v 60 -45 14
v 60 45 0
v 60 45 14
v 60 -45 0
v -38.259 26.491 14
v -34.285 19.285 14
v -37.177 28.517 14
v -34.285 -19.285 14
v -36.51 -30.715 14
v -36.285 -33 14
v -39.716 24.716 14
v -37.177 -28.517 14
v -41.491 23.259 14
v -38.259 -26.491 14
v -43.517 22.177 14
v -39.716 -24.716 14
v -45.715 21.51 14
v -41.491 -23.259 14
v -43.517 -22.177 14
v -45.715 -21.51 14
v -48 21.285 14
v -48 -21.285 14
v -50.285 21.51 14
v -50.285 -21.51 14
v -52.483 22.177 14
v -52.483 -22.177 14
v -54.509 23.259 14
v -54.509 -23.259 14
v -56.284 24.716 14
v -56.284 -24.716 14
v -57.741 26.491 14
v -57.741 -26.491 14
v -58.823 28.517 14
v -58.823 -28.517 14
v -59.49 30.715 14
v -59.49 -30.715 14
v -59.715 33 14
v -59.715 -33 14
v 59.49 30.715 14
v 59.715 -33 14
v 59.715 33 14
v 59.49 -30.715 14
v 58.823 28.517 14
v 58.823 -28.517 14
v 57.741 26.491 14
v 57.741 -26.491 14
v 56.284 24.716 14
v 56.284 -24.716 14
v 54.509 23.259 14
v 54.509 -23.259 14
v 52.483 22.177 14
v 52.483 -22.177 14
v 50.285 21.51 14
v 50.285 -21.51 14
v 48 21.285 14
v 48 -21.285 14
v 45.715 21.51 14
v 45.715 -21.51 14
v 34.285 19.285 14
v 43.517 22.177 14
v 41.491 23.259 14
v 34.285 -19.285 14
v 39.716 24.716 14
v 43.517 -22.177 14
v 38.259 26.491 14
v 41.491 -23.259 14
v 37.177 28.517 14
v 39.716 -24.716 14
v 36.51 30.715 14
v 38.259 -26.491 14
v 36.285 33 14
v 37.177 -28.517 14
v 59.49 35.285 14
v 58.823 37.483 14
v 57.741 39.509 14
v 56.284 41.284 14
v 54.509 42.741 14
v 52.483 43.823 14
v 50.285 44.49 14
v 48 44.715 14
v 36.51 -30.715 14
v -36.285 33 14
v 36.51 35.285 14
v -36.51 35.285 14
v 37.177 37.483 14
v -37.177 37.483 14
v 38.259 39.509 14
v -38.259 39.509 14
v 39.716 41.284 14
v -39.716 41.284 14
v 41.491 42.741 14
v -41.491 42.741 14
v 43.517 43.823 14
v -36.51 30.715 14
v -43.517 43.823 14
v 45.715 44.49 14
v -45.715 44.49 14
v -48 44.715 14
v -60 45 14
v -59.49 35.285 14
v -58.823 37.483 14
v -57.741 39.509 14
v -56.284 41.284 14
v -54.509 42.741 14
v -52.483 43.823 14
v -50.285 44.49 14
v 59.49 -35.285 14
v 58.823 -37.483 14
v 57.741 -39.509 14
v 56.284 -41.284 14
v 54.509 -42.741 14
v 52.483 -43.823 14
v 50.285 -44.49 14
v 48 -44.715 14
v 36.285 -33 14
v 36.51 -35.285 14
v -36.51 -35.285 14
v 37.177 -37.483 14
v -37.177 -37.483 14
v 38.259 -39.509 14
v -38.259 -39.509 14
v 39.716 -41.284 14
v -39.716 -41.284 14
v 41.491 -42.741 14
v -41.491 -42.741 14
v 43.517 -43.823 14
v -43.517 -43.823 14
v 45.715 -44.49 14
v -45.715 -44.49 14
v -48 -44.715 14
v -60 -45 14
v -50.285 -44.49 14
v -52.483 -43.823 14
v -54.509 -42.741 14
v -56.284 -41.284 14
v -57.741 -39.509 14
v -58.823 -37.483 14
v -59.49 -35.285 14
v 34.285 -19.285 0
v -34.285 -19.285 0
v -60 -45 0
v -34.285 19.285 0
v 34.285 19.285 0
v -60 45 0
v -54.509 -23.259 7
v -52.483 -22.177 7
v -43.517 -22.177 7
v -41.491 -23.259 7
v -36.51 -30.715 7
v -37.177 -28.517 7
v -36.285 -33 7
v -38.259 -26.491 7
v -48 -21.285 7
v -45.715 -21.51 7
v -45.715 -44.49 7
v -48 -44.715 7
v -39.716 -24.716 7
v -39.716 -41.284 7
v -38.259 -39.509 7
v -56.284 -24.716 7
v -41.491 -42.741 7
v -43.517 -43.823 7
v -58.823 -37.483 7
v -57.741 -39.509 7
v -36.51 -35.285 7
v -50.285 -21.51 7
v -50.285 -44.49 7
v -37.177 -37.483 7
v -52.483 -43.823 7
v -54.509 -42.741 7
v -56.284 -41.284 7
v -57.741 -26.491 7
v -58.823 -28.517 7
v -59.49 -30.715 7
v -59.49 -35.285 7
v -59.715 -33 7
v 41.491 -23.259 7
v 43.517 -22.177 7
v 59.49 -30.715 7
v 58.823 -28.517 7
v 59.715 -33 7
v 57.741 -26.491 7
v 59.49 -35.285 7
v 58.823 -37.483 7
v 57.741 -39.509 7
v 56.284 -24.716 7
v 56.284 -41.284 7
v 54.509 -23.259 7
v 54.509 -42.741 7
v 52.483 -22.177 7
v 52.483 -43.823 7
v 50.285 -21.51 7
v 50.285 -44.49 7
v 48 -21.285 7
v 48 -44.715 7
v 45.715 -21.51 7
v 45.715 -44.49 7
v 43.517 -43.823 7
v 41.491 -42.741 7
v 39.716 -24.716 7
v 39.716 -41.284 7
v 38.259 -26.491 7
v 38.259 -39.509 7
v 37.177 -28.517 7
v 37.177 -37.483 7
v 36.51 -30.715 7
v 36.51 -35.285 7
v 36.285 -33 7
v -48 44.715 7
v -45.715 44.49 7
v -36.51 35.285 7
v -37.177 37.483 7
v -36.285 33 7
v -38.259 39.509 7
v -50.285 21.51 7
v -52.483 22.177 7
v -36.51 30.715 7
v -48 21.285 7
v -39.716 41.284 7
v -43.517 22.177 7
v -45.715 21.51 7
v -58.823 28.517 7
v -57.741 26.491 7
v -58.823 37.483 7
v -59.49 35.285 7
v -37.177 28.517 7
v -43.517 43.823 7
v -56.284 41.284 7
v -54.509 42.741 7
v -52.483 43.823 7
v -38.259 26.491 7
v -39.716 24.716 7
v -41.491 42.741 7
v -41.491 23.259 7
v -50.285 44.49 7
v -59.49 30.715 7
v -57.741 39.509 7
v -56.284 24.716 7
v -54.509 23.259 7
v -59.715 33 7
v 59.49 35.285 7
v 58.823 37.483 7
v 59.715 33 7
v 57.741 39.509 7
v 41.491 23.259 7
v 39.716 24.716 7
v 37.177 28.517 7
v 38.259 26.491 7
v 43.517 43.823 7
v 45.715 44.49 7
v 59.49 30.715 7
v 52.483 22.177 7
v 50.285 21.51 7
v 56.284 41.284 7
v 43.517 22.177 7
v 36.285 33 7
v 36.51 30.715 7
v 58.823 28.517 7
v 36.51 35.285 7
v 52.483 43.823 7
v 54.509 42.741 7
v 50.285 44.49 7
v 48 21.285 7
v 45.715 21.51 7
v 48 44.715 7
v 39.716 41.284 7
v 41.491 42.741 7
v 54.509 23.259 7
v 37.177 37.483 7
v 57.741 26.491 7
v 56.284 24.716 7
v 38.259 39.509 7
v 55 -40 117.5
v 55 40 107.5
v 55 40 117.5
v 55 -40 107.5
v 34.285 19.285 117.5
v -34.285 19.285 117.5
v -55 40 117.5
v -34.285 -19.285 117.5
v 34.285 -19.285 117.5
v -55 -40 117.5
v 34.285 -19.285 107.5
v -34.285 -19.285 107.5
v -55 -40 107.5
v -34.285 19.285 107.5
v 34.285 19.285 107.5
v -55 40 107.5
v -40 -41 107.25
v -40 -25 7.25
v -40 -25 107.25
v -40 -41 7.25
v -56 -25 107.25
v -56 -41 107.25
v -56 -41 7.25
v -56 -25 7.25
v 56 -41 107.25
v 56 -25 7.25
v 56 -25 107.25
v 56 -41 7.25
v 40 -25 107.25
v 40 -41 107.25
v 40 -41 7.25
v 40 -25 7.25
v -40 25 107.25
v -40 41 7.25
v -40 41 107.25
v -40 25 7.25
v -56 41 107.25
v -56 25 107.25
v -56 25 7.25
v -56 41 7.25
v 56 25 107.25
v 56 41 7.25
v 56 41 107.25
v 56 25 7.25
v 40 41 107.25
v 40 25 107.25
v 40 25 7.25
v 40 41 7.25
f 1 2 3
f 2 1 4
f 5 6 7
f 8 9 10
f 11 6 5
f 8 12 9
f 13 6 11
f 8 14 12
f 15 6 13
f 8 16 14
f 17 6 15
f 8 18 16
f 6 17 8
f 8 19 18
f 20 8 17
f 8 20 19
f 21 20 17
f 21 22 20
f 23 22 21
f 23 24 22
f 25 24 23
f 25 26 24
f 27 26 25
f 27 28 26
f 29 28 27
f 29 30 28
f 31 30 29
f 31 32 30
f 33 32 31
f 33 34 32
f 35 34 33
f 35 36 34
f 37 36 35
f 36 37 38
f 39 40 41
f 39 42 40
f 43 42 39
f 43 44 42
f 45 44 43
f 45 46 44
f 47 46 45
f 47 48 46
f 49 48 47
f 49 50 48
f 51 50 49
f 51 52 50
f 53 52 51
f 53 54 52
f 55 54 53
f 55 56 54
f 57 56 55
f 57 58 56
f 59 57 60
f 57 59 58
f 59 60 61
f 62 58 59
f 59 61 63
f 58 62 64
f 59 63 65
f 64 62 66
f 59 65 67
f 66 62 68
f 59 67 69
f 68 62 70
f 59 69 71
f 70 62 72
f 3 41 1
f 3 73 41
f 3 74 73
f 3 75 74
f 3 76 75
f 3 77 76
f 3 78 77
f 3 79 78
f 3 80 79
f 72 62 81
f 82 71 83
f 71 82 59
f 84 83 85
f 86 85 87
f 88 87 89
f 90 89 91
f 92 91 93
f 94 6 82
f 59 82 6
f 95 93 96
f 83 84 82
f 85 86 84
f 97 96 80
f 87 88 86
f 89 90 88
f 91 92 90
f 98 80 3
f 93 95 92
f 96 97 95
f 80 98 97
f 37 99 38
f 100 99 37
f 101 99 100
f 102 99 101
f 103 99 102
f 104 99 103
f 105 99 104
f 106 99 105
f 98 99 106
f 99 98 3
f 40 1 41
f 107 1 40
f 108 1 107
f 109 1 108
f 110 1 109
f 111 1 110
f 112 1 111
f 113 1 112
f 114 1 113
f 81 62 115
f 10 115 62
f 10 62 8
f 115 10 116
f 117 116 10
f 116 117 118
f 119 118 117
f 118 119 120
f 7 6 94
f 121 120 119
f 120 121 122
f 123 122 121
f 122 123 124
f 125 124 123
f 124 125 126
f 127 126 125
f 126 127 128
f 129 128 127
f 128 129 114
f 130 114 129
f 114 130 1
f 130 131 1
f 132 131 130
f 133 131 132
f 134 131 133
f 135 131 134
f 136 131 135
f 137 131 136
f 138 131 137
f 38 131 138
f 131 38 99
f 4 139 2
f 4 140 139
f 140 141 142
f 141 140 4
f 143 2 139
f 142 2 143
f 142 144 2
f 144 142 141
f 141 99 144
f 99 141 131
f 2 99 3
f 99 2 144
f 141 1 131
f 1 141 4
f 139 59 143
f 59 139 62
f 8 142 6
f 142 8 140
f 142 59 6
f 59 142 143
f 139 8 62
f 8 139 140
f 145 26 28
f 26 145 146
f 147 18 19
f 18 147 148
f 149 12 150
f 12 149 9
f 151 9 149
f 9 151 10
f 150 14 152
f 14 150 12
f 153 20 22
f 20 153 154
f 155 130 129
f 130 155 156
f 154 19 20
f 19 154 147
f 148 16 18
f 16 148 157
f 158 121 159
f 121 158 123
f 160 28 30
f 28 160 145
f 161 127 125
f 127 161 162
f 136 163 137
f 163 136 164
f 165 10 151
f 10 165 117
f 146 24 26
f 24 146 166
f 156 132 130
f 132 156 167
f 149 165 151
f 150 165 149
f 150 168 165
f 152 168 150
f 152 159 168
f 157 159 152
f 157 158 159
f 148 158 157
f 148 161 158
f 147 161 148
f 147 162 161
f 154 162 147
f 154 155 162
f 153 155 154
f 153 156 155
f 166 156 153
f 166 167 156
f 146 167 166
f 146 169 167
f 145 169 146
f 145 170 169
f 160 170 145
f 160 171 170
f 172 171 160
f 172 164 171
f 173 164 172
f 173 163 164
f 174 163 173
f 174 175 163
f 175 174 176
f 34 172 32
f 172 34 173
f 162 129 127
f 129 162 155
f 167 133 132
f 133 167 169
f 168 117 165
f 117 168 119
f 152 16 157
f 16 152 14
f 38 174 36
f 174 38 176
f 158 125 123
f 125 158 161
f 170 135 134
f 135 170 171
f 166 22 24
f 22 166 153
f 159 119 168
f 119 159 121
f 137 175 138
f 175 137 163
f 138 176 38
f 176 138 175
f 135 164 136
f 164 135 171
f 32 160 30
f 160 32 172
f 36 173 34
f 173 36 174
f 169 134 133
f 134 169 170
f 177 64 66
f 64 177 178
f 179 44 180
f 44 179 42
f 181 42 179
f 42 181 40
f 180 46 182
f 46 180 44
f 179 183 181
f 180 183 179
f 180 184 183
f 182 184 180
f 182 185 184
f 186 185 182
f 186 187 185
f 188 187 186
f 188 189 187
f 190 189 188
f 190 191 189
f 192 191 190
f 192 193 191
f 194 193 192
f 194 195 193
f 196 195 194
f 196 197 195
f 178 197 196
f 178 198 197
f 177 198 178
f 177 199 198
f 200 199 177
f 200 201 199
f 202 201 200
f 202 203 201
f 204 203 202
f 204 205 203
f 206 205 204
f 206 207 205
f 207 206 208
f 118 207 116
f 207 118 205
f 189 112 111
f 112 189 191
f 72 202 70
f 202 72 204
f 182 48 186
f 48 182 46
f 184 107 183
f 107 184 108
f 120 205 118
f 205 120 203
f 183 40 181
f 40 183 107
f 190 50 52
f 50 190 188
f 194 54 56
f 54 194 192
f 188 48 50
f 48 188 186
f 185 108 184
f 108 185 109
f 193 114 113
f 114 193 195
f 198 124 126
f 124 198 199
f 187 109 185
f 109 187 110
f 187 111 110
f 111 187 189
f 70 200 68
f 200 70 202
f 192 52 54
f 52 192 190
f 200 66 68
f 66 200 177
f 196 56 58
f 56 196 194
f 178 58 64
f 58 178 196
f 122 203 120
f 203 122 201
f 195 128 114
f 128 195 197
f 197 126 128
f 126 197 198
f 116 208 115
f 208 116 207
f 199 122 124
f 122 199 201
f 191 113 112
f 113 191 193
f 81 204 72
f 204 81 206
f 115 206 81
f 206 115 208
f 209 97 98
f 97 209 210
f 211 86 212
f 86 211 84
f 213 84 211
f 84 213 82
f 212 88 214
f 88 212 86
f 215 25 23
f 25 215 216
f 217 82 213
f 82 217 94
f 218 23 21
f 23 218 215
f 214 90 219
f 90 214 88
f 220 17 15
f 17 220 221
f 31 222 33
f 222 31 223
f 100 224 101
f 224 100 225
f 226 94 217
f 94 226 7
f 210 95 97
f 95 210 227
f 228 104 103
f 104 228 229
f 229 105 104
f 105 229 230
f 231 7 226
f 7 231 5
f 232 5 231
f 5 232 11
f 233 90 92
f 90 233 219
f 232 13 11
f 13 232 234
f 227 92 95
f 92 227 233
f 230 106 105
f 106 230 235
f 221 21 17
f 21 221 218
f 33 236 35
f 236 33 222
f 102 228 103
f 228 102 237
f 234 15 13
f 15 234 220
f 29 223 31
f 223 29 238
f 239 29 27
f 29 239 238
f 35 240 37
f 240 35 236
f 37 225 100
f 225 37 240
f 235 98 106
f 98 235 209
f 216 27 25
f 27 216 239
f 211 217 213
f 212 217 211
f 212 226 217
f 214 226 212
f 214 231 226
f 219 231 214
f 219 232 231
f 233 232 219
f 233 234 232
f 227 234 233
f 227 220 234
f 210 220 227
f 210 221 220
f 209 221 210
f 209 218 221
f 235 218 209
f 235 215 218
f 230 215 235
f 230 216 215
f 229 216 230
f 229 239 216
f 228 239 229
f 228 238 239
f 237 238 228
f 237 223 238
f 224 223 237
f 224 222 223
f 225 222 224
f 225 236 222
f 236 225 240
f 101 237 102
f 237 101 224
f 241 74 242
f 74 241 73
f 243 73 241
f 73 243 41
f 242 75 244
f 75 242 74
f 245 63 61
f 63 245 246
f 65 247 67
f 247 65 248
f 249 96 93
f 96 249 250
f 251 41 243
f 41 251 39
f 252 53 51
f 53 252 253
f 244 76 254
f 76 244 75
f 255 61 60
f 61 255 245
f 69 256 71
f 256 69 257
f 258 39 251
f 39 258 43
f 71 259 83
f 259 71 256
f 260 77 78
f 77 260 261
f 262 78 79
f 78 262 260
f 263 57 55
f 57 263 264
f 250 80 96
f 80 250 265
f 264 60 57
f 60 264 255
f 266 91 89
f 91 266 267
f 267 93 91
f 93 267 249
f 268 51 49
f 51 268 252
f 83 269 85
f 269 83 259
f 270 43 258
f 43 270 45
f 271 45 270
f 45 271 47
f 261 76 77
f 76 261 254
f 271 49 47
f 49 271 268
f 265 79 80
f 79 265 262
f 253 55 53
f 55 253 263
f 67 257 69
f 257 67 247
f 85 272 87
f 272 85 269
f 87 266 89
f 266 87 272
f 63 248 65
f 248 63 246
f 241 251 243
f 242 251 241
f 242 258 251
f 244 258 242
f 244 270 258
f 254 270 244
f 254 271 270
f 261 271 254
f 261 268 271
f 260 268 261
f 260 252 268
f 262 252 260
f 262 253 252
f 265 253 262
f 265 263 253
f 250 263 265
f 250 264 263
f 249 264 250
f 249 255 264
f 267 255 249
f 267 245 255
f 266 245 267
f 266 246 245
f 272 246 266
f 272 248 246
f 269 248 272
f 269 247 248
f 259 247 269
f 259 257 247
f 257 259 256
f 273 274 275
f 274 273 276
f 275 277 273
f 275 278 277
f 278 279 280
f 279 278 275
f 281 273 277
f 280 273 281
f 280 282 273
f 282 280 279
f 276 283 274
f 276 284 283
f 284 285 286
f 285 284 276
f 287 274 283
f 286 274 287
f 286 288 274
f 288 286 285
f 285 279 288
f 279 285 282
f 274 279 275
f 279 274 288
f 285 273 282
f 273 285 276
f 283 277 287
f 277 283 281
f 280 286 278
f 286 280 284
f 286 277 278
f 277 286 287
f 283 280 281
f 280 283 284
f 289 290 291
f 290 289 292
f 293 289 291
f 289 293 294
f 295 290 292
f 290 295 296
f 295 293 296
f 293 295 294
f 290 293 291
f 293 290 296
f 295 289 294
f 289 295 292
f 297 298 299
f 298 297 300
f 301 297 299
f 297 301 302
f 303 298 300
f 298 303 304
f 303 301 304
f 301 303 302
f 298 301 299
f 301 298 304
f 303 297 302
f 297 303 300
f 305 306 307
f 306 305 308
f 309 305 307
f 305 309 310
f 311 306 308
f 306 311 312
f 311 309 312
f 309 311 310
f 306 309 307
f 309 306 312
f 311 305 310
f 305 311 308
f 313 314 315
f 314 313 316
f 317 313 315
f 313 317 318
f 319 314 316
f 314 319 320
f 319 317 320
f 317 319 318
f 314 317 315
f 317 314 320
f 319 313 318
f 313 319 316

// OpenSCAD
$fn = 32;

// ------------------------------------------------------------------------
// Frame cube: base 120 x 90 mm, posts 100 mm tall
// Every part is its own module, assembly() places every instance.
// ------------------------------------------------------------------------

// --- part 1 ---
module base_frame() {
  difference() {
    translate([-60, -45, 0]) cube([120, 90, 14]);
    translate([-34.285, -19.285, -1]) cube([68.57, 38.57, 16]);
    translate([-48, -33, 7]) cylinder(h = 8, d = 23.43);
    translate([48, -33, 7]) cylinder(h = 8, d = 23.43);
    translate([-48, 33, 7]) cylinder(h = 8, d = 23.43);
    translate([48, 33, 7]) cylinder(h = 8, d = 23.43);
  }
}

// --- part 2 ---
module corner_post() {
  translate([-8, -8, 0]) cube([16, 16, 100]);
}

// --- part 3 ---
module top_frame() {
  difference() {
    translate([-55, -40, 0]) cube([110, 80, 10]);
    translate([-34.285, -19.285, -1]) cube([68.57, 38.57, 12]);
  }
}

// --- assembly ---
module assembly() {
  color([0.80, 0.24, 0.20]) translate([0, 0, 0]) rotate([0, 0, 0]) base_frame();
  color([0.20, 0.45, 0.75]) translate([-48, -33, 7.25]) rotate([0, 0, 0]) corner_post();
  color([0.25, 0.62, 0.32]) translate([48, -33, 7.25]) rotate([0, 0, 0]) corner_post();
  color([0.92, 0.70, 0.18]) translate([-48, 33, 7.25]) rotate([0, 0, 0]) corner_post();
  color([0.58, 0.35, 0.70]) translate([48, 33, 7.25]) rotate([0, 0, 0]) corner_post();
  color([0.16, 0.66, 0.66]) translate([0, 0, 107.5]) rotate([0, 0, 0]) top_frame();
}

assembly();
